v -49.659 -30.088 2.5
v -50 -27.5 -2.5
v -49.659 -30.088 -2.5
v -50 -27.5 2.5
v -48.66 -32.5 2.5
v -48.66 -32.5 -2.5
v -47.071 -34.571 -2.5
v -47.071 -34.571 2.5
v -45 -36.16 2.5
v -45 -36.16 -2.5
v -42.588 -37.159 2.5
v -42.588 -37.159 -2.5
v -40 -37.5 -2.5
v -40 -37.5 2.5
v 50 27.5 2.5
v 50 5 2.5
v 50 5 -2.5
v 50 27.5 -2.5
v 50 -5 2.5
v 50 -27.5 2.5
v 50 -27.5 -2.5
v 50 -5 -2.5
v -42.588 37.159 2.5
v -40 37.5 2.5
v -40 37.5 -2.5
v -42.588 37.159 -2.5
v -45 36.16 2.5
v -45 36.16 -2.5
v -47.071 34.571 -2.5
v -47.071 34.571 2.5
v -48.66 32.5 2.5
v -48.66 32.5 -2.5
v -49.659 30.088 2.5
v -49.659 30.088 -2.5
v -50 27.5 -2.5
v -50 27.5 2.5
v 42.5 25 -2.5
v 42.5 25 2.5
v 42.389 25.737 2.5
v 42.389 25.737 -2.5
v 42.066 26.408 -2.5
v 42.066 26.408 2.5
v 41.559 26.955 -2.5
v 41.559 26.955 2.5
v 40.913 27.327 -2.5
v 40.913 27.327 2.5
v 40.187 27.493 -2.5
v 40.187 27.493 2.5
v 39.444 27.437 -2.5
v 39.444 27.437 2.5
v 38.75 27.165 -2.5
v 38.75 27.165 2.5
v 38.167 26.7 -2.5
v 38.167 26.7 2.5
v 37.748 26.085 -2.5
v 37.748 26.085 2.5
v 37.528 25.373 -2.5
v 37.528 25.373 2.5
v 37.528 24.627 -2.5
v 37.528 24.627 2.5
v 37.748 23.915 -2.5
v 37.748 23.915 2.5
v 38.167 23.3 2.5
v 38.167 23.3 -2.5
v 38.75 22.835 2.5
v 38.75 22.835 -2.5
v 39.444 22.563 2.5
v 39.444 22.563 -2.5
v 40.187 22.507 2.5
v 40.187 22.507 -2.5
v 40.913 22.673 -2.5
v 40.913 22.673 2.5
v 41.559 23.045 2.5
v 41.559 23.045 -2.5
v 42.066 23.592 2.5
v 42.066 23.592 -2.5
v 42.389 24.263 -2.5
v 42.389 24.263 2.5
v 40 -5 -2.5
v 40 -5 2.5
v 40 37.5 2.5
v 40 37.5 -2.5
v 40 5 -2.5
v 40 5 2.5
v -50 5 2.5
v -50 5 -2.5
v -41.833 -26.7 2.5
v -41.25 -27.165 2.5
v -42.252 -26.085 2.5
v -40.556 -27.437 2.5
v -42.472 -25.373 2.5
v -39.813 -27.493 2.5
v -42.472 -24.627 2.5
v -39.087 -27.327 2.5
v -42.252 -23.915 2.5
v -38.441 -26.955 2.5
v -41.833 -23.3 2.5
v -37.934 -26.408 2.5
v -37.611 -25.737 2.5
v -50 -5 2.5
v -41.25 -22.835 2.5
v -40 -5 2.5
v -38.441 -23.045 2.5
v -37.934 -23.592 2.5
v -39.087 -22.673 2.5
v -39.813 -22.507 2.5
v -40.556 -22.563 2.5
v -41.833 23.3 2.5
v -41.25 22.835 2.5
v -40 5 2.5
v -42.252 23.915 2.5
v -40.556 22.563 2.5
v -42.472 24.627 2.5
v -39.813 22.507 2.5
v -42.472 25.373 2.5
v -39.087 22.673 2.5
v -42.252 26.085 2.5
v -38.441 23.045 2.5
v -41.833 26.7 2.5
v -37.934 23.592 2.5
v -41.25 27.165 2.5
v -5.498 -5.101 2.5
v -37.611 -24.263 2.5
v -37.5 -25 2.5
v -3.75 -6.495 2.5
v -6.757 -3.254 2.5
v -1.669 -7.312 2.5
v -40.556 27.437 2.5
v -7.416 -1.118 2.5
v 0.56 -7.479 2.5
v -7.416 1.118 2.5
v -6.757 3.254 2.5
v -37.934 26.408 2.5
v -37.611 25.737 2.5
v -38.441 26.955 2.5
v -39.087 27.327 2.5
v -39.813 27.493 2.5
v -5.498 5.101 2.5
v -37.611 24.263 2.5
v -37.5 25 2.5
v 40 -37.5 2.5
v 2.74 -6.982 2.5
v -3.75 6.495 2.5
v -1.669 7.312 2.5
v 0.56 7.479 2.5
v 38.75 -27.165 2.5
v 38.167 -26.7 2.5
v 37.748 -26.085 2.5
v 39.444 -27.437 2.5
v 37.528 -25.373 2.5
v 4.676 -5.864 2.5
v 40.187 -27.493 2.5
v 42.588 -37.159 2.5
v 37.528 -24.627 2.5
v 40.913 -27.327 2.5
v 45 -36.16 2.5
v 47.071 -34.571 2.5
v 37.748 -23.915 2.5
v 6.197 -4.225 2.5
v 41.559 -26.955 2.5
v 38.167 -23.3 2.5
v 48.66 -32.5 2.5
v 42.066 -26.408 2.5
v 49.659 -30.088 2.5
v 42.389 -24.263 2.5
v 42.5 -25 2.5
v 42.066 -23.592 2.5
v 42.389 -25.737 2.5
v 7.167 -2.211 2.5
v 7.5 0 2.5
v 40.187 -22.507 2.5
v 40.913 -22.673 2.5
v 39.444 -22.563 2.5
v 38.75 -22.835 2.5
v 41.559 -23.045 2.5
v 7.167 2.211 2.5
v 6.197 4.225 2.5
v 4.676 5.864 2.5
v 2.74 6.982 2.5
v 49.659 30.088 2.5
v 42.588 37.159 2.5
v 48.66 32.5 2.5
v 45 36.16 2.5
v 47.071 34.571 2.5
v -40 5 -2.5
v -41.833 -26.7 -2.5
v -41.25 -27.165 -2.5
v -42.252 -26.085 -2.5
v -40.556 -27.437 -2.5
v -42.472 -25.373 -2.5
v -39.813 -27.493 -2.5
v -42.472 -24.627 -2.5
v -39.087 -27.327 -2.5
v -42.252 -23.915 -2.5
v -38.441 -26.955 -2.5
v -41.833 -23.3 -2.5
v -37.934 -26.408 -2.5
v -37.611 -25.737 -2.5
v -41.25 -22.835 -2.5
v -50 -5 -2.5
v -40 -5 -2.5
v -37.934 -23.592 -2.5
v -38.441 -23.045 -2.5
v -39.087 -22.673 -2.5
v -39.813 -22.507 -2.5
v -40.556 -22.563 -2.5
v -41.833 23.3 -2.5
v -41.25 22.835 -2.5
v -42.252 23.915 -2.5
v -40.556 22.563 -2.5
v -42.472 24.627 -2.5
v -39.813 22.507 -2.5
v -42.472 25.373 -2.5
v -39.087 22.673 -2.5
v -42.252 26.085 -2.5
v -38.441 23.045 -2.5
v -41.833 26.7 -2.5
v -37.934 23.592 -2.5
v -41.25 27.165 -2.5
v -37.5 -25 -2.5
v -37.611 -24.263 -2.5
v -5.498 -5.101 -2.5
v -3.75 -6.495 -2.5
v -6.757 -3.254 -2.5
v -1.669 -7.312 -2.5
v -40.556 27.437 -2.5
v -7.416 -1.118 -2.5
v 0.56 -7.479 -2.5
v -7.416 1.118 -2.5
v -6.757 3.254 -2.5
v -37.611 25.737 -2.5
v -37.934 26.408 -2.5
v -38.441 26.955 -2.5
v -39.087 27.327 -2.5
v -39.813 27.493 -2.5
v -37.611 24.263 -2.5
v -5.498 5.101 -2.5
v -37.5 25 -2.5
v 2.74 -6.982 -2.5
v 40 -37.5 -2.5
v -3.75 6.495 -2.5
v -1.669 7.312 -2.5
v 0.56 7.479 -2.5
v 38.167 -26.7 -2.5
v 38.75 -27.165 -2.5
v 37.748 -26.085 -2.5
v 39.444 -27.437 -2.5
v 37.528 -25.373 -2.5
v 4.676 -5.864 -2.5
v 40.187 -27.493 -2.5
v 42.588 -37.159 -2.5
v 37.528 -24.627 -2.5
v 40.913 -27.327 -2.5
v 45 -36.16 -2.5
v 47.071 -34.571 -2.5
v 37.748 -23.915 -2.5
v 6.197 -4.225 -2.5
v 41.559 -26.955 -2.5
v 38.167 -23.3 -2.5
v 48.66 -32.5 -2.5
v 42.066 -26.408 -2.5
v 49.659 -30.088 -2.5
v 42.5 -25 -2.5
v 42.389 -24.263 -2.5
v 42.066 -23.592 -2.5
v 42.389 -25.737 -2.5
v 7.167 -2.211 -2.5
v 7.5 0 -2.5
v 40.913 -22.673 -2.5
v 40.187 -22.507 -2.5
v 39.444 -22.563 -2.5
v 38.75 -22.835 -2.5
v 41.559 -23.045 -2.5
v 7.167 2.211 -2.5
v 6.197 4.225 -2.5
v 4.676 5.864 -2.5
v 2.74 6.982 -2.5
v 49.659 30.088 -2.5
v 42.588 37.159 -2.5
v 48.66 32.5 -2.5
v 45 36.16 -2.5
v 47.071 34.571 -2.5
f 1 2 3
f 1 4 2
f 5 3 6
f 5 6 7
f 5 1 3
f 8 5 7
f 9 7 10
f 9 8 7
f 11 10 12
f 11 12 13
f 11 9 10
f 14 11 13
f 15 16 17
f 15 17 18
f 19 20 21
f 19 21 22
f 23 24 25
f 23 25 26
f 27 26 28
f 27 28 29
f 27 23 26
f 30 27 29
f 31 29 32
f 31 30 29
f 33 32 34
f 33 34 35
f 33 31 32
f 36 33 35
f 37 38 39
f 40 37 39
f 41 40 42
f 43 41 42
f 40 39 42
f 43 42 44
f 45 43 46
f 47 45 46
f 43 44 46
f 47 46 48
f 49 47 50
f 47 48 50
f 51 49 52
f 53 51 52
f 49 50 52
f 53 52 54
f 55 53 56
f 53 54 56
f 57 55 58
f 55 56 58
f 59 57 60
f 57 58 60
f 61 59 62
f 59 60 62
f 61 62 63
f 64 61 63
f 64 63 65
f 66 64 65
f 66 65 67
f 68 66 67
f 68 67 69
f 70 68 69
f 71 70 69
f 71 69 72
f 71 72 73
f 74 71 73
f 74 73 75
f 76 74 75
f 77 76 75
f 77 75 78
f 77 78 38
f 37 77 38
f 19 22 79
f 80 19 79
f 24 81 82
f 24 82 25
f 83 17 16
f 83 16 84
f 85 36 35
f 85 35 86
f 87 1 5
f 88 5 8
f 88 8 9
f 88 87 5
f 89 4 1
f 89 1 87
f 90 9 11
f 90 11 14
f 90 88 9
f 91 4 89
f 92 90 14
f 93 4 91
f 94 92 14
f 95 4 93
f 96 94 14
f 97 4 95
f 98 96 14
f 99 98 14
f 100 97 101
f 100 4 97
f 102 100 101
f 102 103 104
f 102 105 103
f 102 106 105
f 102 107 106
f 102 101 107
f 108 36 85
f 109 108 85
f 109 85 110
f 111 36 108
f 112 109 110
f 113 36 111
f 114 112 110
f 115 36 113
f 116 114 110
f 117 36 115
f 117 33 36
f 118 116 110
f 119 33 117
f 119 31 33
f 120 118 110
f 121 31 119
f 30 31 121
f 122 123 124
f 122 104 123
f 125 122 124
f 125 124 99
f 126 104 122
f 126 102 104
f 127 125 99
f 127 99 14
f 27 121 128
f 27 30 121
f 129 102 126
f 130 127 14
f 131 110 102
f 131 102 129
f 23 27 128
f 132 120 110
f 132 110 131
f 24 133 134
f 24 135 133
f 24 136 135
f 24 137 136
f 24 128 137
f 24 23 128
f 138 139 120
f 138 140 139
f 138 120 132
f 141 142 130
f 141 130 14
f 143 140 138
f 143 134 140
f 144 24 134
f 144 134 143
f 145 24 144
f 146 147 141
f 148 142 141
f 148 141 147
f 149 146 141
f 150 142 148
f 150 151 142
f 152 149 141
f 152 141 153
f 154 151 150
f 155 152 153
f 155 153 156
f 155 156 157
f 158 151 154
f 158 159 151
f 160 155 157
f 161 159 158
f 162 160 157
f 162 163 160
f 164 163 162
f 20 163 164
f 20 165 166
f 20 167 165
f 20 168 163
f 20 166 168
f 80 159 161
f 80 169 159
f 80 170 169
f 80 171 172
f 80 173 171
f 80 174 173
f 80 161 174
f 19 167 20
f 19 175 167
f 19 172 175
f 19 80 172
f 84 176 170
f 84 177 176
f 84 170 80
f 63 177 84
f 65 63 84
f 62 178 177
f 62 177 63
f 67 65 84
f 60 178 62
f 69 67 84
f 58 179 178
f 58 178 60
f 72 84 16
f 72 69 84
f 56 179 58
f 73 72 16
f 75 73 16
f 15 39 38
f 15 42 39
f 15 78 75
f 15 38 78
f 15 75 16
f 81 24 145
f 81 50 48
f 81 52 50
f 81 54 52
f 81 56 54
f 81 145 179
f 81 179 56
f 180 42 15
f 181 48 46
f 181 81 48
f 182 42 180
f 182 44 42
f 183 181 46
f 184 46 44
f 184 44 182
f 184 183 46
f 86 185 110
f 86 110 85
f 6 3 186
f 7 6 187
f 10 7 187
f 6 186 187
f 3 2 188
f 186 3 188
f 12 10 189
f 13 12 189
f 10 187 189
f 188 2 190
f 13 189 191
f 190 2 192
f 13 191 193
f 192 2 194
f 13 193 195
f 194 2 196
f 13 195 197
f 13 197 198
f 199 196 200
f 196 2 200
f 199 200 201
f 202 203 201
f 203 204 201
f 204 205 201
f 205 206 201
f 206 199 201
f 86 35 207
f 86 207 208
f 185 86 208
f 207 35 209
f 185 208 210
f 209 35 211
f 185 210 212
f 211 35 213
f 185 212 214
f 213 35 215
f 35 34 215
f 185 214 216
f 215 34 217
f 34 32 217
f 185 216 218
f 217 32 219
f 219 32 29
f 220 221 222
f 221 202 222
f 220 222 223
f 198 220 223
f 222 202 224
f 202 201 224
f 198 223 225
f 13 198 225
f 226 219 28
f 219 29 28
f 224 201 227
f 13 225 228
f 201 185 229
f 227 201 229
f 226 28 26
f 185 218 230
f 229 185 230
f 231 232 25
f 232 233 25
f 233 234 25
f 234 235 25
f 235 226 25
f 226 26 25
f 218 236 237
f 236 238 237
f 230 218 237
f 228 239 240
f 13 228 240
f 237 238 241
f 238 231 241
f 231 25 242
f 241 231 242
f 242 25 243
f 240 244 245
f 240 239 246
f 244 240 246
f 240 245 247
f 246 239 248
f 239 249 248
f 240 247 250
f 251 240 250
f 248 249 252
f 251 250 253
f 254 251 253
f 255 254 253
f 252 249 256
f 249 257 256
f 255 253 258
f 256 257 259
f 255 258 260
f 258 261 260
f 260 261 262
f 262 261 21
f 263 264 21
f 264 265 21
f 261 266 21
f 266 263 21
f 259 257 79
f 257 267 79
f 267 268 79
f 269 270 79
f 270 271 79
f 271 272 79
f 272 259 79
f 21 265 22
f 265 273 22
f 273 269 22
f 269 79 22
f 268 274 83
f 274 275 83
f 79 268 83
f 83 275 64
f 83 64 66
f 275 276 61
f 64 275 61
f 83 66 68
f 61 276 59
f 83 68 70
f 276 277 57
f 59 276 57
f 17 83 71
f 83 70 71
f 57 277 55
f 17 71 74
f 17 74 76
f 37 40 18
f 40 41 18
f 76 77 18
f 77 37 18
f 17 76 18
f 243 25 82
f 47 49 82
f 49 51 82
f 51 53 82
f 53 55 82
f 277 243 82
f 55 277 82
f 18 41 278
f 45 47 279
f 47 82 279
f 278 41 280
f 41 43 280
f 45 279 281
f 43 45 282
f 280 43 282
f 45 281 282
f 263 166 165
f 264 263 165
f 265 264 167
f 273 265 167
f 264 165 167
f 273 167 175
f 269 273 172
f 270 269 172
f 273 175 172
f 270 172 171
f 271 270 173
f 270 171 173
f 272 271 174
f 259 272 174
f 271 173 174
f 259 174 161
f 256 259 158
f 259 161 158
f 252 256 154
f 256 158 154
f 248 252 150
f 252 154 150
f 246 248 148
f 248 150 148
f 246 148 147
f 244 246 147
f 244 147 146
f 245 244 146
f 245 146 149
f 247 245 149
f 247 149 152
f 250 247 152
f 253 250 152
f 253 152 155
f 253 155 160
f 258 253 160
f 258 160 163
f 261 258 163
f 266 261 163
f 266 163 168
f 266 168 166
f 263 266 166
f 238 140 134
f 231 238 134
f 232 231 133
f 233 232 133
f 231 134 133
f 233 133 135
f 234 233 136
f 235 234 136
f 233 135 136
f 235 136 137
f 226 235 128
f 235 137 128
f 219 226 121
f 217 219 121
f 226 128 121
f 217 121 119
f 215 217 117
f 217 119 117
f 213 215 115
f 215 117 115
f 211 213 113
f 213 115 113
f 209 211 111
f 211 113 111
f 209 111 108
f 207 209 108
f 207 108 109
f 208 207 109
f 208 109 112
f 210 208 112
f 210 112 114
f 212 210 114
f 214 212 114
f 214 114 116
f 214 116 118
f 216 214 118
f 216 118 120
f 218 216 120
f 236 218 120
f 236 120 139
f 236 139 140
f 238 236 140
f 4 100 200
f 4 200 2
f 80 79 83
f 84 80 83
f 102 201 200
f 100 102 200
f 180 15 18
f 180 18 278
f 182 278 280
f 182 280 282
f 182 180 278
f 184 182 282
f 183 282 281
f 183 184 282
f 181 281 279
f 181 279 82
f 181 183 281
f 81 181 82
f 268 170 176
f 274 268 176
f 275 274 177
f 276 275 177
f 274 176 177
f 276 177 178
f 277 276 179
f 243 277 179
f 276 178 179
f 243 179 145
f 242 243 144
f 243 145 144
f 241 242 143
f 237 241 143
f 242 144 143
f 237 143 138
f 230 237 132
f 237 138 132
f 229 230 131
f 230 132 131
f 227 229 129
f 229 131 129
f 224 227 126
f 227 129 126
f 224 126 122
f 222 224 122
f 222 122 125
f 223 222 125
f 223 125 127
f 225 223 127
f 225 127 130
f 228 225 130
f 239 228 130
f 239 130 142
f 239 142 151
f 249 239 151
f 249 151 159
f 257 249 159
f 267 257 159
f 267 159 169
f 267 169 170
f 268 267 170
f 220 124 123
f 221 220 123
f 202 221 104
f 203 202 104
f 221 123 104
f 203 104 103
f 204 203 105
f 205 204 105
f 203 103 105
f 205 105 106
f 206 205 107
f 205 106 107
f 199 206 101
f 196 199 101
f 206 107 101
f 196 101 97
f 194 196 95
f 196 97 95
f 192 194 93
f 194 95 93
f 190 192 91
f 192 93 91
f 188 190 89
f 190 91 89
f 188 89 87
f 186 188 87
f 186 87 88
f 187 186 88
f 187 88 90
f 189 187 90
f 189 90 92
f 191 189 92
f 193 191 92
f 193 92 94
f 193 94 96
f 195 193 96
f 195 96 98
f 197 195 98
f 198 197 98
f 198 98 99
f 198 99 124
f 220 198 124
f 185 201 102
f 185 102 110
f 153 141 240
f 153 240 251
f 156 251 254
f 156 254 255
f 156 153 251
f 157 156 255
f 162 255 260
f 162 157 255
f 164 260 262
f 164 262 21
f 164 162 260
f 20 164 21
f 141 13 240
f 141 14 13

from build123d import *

# Parameters (mm, degrees)
BOSS_EXTRUDE1_DEPTH = 2.5
SKETCH2_R           = 2.5
SKETCH2_R_2         = 7.5
CUT_EXTRUDE1_DEPTH  = 63.69968102
SKETCH4_W           = 10
SKETCH4_H           = 10
CUT_EXTRUDE3_DEPTH  = 10


with BuildPart() as part:
    # Sketch1 → Boss-Extrude1 (new, symmetric)
    with BuildSketch(Plane.XY):
        with BuildLine():
            Line((-40, -37.5), (40, -37.5))
            ThreePointArc((40, -37.5), (47.071067812, -34.571067812), (50, -27.5))
            Line((50, -27.5), (50, 27.5))
            ThreePointArc((50, 27.5), (47.071067812, 34.571067812), (40, 37.5))
            Line((40, 37.5), (-40, 37.5))
            ThreePointArc((-40, 37.5), (-47.071067812, 34.571067812), (-50, 27.5))
            Line((-50, 27.5), (-50, -27.5))
            ThreePointArc((-50, -27.5), (-47.071067812, -34.571067812), (-40, -37.5))
        make_face()
    extrude(amount=BOSS_EXTRUDE1_DEPTH, both=True)

    # Sketch2 → Cut-Extrude1 (cut, through all)
    with BuildSketch(Plane.XY.offset(2.5)):
        with Locations((40, 25)):
            Circle(SKETCH2_R)
        with Locations((-40, 25)):
            Circle(SKETCH2_R)
        with Locations((-40, -25)):
            Circle(SKETCH2_R)
        with Locations((40, -25)):
            Circle(SKETCH2_R)
        Circle(SKETCH2_R_2)
    extrude(amount=-CUT_EXTRUDE1_DEPTH, mode=Mode.SUBTRACT)

    # Sketch4 → Cut-Extrude3 (cut)
    with BuildSketch(Plane(origin=(0, 0, -2.5), x_dir=(-1, 0, 0), z_dir=(0, 0, -1))):
        with Locations((45, 0)):
            Rectangle(SKETCH4_W, SKETCH4_H)
        with Locations((-45, 0)):
            Rectangle(SKETCH4_W, SKETCH4_H)
    extrude(amount=-CUT_EXTRUDE3_DEPTH, mode=Mode.SUBTRACT)


solid = part.part
